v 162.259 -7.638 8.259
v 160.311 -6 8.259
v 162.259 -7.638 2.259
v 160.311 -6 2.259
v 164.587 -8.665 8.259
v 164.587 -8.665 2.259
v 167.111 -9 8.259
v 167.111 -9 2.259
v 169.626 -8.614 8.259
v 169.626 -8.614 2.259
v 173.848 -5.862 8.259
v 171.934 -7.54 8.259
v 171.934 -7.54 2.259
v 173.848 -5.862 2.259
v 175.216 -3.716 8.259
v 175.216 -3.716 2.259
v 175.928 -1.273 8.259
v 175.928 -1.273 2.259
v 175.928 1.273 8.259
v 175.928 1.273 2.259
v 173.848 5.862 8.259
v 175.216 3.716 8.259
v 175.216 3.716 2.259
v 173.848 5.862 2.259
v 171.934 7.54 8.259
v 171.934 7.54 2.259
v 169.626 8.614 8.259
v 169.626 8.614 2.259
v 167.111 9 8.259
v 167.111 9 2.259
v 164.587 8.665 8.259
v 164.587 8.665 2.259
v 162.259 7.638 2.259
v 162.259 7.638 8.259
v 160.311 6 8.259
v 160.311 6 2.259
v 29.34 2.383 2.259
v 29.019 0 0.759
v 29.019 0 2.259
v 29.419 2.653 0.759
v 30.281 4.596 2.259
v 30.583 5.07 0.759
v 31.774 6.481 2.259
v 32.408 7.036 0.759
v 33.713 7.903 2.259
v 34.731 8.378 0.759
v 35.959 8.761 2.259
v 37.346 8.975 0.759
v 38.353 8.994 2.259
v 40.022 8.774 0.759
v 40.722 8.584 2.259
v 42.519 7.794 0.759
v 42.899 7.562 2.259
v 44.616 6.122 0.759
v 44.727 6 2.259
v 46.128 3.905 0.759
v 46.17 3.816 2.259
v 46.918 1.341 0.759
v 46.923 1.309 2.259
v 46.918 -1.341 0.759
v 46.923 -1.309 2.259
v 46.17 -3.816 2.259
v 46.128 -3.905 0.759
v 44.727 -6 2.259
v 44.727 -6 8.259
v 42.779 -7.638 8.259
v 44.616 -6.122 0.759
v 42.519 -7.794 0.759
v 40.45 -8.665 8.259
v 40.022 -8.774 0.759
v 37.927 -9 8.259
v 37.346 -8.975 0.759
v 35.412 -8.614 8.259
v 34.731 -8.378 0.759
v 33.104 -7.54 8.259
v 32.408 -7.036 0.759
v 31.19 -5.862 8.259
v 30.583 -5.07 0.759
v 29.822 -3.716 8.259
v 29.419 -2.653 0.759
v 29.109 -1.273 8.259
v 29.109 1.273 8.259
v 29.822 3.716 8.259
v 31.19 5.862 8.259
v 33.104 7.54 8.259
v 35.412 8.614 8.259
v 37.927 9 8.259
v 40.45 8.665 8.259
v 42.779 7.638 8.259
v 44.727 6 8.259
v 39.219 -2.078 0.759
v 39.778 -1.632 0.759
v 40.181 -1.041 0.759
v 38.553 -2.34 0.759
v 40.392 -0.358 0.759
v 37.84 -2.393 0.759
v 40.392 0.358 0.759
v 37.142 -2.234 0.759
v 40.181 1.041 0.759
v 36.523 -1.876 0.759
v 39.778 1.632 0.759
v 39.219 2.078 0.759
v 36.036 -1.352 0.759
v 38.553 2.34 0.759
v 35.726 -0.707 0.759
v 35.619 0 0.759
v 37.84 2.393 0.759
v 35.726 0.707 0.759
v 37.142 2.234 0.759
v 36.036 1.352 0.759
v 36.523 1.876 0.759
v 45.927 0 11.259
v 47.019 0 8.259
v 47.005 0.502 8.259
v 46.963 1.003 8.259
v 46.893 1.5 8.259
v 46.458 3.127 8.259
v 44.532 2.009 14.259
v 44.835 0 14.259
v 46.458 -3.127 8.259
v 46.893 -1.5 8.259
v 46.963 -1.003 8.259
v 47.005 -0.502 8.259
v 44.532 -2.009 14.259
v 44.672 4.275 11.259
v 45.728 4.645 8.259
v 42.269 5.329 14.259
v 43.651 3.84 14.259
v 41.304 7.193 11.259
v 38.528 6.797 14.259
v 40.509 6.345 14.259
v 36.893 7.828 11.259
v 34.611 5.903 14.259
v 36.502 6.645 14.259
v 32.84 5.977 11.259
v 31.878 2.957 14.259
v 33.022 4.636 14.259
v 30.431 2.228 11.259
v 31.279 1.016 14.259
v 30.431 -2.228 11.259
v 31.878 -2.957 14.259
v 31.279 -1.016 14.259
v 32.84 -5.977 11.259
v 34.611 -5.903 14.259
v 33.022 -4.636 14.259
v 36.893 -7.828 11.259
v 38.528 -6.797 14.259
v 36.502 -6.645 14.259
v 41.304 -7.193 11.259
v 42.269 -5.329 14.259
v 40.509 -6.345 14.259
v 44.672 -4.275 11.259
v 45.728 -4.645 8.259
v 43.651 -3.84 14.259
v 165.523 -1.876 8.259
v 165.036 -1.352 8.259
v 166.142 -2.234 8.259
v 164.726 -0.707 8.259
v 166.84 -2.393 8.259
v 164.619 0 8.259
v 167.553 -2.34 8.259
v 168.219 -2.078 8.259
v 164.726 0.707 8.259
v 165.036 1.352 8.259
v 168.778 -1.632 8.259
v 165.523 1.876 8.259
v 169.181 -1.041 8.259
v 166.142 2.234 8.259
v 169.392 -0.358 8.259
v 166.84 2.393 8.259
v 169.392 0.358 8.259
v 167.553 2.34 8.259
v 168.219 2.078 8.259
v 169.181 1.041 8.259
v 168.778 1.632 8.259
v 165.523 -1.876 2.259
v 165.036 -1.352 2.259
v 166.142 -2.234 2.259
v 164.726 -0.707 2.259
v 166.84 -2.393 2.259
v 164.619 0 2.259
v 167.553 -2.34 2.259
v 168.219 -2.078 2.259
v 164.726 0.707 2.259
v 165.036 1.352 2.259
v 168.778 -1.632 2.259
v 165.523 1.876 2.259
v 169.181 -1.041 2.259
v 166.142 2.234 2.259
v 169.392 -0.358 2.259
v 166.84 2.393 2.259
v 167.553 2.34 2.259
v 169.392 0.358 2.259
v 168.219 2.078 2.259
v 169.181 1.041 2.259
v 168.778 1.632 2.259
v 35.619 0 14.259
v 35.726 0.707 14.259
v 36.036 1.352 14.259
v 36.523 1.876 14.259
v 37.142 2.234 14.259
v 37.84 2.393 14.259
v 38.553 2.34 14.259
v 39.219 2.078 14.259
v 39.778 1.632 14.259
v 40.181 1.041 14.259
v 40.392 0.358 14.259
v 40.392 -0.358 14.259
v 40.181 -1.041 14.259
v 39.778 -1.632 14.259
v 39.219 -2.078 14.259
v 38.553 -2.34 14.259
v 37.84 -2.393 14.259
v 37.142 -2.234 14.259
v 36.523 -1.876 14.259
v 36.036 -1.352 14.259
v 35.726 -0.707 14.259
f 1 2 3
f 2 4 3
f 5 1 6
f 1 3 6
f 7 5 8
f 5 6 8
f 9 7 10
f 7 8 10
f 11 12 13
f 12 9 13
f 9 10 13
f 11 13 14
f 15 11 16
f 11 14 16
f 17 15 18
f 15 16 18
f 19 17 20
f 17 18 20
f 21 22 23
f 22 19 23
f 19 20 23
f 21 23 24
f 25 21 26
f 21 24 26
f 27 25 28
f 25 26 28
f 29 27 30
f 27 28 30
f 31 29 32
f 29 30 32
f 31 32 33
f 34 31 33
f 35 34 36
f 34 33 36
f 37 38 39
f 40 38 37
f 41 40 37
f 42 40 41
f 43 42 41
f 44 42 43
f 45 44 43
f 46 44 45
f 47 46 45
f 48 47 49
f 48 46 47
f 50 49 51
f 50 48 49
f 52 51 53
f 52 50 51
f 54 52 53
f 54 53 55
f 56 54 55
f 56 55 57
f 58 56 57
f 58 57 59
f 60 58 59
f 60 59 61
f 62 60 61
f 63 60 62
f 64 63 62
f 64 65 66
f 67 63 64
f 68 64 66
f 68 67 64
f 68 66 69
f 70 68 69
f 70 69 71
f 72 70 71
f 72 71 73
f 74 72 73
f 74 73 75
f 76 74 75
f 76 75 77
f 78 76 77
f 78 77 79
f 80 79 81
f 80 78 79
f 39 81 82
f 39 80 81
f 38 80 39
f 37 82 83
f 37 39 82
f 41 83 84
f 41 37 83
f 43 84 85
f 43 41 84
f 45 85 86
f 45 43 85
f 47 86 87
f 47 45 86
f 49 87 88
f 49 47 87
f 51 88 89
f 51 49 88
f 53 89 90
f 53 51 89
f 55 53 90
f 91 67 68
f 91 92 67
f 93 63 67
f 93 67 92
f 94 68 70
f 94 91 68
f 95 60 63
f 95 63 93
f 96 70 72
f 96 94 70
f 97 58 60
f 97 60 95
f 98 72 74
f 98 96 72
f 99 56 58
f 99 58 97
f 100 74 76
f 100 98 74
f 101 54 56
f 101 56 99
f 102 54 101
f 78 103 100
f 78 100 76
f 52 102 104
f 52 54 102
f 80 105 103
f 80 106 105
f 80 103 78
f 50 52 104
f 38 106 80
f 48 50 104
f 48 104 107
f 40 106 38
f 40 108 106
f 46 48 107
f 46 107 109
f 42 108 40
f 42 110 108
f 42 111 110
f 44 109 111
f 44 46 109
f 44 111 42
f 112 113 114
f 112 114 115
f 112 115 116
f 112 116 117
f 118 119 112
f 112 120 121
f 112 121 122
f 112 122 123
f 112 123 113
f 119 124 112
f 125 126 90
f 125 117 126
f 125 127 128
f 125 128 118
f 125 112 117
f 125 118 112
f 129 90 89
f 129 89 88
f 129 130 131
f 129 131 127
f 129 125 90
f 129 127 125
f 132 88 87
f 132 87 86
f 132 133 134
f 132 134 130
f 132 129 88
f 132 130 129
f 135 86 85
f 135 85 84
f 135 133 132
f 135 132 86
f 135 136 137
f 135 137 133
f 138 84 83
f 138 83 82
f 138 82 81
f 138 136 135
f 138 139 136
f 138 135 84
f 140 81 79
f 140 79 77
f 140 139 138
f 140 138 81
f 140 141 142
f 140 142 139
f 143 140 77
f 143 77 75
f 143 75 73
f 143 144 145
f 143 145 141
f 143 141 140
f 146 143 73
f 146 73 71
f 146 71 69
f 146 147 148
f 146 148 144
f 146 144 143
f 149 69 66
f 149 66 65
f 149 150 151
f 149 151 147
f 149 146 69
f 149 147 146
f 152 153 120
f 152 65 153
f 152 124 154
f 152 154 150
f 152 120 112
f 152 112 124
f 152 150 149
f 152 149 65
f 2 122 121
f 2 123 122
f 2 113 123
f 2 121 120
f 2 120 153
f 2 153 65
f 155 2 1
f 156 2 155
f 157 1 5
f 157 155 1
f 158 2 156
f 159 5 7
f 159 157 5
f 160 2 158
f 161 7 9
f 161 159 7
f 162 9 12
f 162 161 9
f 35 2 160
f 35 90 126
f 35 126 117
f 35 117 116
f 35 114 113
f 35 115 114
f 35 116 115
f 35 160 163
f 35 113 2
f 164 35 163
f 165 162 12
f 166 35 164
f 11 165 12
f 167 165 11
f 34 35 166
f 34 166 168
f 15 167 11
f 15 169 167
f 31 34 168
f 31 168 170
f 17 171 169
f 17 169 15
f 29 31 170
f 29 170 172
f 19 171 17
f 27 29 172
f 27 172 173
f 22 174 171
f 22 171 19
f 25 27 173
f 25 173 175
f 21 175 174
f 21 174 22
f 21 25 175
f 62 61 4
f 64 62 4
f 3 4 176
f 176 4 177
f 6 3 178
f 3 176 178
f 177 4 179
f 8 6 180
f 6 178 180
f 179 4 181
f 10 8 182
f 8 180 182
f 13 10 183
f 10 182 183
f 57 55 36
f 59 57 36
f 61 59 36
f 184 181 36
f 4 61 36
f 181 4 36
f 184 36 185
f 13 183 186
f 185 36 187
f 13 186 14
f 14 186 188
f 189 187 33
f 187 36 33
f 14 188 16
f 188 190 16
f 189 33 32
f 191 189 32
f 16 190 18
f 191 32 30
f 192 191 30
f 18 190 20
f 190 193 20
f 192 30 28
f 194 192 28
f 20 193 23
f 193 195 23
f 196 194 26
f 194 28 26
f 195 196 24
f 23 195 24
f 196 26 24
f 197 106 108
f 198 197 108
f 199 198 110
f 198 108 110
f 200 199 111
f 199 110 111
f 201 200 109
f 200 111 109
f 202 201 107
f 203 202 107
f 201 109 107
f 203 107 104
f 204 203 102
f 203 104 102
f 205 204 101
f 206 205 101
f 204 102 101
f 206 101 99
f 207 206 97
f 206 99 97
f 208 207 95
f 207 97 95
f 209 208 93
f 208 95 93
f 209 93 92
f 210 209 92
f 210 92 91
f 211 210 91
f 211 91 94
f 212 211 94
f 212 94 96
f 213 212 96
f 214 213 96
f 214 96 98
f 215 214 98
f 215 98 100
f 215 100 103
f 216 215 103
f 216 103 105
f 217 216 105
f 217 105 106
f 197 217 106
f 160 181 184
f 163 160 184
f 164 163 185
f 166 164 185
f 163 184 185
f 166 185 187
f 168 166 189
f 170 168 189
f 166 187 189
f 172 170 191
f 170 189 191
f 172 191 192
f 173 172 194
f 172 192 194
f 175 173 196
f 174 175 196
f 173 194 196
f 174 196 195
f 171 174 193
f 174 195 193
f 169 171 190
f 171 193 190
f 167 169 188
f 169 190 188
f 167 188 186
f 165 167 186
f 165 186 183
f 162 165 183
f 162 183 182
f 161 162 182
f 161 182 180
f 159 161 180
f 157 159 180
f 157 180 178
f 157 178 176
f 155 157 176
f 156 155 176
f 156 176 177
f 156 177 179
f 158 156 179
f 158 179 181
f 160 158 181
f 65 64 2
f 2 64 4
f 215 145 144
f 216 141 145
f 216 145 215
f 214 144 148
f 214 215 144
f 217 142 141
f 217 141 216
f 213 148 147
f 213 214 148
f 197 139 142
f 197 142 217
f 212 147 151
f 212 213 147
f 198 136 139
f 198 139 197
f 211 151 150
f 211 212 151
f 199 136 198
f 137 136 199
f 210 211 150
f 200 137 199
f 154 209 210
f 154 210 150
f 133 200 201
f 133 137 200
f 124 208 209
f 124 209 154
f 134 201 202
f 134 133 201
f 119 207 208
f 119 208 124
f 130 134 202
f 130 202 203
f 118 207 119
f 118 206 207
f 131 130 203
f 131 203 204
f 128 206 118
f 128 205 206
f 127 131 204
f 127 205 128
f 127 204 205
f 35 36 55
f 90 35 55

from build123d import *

# Parameters (mm, degrees)
SKETCH1_R             = 15
BOSS_EXTRUDE1_DEPTH   = 10
BOSS_EXTRUDE1_2_DEPTH = 10
SKETCH2_R             = 15
BOSS_EXTRUDE2_DEPTH   = 10
BOSS_EXTRUDE2_TAPER   = 20
BOSS_EXTRUDE3_DEPTH   = 5
BOSS_EXTRUDE4_DEPTH   = 5
SKETCH13_R            = 4
CUT_EXTRUDE1_DEPTH    = 20
BOSS_EXTRUDE7_START   = 2.5
SKETCH14_R            = 15
SKETCH14_R_2          = 4
BOSS_EXTRUDE7_DEPTH   = 2.5
ECHELLE1_SCALE        = 0.6


with BuildPart() as part:
    # Sketch1 → Boss-Extrude1 (new body)
    with BuildSketch(Plane.XY):
        Circle(SKETCH1_R)
    extrude(amount=BOSS_EXTRUDE1_DEPTH)

    # Sketch2 → Boss-Extrude2 (add)
    with BuildSketch(Plane.XY.offset(10)):
        Circle(SKETCH2_R)
    extrude(amount=BOSS_EXTRUDE2_DEPTH, taper=BOSS_EXTRUDE2_TAPER)



with BuildPart() as body_2:
    # Sketch1 → Boss-Extrude1 2 (new body)
    with BuildSketch(Plane.XY):
        with Locations((215, 0)):
            Circle(SKETCH1_R)
    extrude(amount=BOSS_EXTRUDE1_2_DEPTH)


with BuildPart() as part_1:
    add(part.part)

    add(body_2.part)  # Boss-Extrude3 merges body 2
    # Sketch5 → Boss-Extrude3 (add)
    with BuildSketch(Plane.XY):
        with BuildLine():
            Line((203.819660113, 10), (11.180339887, 10))
            ThreePointArc((11.180339887, 10), (14.012585384, 5.352331347), (15, 0))
            ThreePointArc((15, 0), (14.012585384, -5.352331347), (11.180339887, -10))
            Line((11.180339887, -10), (203.819660113, -10))
            ThreePointArc((203.819660113, -10), (200, 0), (203.819660113, 10))
        make_face()
    extrude(amount=BOSS_EXTRUDE3_DEPTH)

    # Sketch6 → Boss-Extrude4 (add)
    with BuildSketch(Plane.XY.offset(5)):
        with BuildLine():
            ThreePointArc((15, 0), (14.947457842, -1.254393904), (14.790199458, -2.5))
            ThreePointArc((14.790199458, -2.5), (13.515906498, -6.505403256), (11.180339887, -10))
            Line((11.180339887, -10), (203.819660113, -10))
            ThreePointArc((203.819660113, -10), (200, 0), (203.819660113, 10))
            Line((203.819660113, 10), (11.180339887, 10))
            ThreePointArc((11.180339887, 10), (13.515906498, 6.505403256), (14.790199458, 2.5))
            ThreePointArc((14.790199458, 2.5), (14.947457842, 1.254393904), (15, 0))
        make_face()
    extrude(amount=BOSS_EXTRUDE4_DEPTH)

    # Sketch13 → Cut-Extrude1 (cut)
    with BuildSketch(Plane(origin=(0, 0, 0), x_dir=(-1, 0, 0), z_dir=(0, 0, -1))):
        with Locations((-215, 0)):
            Circle(SKETCH13_R)
        Circle(SKETCH13_R)
    extrude(amount=-CUT_EXTRUDE1_DEPTH, mode=Mode.SUBTRACT)

    # Sketch14 → Boss-Extrude7 (add)
    with BuildSketch(Plane(origin=(0, 0, 0), x_dir=(-1, 0, 0), z_dir=(0, 0, -1)).offset(BOSS_EXTRUDE7_START)):
        Circle(SKETCH14_R)
        Circle(SKETCH14_R_2, mode=Mode.SUBTRACT)
    extrude(amount=-BOSS_EXTRUDE7_DEPTH)


with BuildPart() as part_2:
    # Echelle1: scaled about (95.047310585, 0, 5.648530127)
    add(part_1.part.scale(ECHELLE1_SCALE).moved(Location((38.018924234, 0, 2.259412051))))


solid = part_2.part
